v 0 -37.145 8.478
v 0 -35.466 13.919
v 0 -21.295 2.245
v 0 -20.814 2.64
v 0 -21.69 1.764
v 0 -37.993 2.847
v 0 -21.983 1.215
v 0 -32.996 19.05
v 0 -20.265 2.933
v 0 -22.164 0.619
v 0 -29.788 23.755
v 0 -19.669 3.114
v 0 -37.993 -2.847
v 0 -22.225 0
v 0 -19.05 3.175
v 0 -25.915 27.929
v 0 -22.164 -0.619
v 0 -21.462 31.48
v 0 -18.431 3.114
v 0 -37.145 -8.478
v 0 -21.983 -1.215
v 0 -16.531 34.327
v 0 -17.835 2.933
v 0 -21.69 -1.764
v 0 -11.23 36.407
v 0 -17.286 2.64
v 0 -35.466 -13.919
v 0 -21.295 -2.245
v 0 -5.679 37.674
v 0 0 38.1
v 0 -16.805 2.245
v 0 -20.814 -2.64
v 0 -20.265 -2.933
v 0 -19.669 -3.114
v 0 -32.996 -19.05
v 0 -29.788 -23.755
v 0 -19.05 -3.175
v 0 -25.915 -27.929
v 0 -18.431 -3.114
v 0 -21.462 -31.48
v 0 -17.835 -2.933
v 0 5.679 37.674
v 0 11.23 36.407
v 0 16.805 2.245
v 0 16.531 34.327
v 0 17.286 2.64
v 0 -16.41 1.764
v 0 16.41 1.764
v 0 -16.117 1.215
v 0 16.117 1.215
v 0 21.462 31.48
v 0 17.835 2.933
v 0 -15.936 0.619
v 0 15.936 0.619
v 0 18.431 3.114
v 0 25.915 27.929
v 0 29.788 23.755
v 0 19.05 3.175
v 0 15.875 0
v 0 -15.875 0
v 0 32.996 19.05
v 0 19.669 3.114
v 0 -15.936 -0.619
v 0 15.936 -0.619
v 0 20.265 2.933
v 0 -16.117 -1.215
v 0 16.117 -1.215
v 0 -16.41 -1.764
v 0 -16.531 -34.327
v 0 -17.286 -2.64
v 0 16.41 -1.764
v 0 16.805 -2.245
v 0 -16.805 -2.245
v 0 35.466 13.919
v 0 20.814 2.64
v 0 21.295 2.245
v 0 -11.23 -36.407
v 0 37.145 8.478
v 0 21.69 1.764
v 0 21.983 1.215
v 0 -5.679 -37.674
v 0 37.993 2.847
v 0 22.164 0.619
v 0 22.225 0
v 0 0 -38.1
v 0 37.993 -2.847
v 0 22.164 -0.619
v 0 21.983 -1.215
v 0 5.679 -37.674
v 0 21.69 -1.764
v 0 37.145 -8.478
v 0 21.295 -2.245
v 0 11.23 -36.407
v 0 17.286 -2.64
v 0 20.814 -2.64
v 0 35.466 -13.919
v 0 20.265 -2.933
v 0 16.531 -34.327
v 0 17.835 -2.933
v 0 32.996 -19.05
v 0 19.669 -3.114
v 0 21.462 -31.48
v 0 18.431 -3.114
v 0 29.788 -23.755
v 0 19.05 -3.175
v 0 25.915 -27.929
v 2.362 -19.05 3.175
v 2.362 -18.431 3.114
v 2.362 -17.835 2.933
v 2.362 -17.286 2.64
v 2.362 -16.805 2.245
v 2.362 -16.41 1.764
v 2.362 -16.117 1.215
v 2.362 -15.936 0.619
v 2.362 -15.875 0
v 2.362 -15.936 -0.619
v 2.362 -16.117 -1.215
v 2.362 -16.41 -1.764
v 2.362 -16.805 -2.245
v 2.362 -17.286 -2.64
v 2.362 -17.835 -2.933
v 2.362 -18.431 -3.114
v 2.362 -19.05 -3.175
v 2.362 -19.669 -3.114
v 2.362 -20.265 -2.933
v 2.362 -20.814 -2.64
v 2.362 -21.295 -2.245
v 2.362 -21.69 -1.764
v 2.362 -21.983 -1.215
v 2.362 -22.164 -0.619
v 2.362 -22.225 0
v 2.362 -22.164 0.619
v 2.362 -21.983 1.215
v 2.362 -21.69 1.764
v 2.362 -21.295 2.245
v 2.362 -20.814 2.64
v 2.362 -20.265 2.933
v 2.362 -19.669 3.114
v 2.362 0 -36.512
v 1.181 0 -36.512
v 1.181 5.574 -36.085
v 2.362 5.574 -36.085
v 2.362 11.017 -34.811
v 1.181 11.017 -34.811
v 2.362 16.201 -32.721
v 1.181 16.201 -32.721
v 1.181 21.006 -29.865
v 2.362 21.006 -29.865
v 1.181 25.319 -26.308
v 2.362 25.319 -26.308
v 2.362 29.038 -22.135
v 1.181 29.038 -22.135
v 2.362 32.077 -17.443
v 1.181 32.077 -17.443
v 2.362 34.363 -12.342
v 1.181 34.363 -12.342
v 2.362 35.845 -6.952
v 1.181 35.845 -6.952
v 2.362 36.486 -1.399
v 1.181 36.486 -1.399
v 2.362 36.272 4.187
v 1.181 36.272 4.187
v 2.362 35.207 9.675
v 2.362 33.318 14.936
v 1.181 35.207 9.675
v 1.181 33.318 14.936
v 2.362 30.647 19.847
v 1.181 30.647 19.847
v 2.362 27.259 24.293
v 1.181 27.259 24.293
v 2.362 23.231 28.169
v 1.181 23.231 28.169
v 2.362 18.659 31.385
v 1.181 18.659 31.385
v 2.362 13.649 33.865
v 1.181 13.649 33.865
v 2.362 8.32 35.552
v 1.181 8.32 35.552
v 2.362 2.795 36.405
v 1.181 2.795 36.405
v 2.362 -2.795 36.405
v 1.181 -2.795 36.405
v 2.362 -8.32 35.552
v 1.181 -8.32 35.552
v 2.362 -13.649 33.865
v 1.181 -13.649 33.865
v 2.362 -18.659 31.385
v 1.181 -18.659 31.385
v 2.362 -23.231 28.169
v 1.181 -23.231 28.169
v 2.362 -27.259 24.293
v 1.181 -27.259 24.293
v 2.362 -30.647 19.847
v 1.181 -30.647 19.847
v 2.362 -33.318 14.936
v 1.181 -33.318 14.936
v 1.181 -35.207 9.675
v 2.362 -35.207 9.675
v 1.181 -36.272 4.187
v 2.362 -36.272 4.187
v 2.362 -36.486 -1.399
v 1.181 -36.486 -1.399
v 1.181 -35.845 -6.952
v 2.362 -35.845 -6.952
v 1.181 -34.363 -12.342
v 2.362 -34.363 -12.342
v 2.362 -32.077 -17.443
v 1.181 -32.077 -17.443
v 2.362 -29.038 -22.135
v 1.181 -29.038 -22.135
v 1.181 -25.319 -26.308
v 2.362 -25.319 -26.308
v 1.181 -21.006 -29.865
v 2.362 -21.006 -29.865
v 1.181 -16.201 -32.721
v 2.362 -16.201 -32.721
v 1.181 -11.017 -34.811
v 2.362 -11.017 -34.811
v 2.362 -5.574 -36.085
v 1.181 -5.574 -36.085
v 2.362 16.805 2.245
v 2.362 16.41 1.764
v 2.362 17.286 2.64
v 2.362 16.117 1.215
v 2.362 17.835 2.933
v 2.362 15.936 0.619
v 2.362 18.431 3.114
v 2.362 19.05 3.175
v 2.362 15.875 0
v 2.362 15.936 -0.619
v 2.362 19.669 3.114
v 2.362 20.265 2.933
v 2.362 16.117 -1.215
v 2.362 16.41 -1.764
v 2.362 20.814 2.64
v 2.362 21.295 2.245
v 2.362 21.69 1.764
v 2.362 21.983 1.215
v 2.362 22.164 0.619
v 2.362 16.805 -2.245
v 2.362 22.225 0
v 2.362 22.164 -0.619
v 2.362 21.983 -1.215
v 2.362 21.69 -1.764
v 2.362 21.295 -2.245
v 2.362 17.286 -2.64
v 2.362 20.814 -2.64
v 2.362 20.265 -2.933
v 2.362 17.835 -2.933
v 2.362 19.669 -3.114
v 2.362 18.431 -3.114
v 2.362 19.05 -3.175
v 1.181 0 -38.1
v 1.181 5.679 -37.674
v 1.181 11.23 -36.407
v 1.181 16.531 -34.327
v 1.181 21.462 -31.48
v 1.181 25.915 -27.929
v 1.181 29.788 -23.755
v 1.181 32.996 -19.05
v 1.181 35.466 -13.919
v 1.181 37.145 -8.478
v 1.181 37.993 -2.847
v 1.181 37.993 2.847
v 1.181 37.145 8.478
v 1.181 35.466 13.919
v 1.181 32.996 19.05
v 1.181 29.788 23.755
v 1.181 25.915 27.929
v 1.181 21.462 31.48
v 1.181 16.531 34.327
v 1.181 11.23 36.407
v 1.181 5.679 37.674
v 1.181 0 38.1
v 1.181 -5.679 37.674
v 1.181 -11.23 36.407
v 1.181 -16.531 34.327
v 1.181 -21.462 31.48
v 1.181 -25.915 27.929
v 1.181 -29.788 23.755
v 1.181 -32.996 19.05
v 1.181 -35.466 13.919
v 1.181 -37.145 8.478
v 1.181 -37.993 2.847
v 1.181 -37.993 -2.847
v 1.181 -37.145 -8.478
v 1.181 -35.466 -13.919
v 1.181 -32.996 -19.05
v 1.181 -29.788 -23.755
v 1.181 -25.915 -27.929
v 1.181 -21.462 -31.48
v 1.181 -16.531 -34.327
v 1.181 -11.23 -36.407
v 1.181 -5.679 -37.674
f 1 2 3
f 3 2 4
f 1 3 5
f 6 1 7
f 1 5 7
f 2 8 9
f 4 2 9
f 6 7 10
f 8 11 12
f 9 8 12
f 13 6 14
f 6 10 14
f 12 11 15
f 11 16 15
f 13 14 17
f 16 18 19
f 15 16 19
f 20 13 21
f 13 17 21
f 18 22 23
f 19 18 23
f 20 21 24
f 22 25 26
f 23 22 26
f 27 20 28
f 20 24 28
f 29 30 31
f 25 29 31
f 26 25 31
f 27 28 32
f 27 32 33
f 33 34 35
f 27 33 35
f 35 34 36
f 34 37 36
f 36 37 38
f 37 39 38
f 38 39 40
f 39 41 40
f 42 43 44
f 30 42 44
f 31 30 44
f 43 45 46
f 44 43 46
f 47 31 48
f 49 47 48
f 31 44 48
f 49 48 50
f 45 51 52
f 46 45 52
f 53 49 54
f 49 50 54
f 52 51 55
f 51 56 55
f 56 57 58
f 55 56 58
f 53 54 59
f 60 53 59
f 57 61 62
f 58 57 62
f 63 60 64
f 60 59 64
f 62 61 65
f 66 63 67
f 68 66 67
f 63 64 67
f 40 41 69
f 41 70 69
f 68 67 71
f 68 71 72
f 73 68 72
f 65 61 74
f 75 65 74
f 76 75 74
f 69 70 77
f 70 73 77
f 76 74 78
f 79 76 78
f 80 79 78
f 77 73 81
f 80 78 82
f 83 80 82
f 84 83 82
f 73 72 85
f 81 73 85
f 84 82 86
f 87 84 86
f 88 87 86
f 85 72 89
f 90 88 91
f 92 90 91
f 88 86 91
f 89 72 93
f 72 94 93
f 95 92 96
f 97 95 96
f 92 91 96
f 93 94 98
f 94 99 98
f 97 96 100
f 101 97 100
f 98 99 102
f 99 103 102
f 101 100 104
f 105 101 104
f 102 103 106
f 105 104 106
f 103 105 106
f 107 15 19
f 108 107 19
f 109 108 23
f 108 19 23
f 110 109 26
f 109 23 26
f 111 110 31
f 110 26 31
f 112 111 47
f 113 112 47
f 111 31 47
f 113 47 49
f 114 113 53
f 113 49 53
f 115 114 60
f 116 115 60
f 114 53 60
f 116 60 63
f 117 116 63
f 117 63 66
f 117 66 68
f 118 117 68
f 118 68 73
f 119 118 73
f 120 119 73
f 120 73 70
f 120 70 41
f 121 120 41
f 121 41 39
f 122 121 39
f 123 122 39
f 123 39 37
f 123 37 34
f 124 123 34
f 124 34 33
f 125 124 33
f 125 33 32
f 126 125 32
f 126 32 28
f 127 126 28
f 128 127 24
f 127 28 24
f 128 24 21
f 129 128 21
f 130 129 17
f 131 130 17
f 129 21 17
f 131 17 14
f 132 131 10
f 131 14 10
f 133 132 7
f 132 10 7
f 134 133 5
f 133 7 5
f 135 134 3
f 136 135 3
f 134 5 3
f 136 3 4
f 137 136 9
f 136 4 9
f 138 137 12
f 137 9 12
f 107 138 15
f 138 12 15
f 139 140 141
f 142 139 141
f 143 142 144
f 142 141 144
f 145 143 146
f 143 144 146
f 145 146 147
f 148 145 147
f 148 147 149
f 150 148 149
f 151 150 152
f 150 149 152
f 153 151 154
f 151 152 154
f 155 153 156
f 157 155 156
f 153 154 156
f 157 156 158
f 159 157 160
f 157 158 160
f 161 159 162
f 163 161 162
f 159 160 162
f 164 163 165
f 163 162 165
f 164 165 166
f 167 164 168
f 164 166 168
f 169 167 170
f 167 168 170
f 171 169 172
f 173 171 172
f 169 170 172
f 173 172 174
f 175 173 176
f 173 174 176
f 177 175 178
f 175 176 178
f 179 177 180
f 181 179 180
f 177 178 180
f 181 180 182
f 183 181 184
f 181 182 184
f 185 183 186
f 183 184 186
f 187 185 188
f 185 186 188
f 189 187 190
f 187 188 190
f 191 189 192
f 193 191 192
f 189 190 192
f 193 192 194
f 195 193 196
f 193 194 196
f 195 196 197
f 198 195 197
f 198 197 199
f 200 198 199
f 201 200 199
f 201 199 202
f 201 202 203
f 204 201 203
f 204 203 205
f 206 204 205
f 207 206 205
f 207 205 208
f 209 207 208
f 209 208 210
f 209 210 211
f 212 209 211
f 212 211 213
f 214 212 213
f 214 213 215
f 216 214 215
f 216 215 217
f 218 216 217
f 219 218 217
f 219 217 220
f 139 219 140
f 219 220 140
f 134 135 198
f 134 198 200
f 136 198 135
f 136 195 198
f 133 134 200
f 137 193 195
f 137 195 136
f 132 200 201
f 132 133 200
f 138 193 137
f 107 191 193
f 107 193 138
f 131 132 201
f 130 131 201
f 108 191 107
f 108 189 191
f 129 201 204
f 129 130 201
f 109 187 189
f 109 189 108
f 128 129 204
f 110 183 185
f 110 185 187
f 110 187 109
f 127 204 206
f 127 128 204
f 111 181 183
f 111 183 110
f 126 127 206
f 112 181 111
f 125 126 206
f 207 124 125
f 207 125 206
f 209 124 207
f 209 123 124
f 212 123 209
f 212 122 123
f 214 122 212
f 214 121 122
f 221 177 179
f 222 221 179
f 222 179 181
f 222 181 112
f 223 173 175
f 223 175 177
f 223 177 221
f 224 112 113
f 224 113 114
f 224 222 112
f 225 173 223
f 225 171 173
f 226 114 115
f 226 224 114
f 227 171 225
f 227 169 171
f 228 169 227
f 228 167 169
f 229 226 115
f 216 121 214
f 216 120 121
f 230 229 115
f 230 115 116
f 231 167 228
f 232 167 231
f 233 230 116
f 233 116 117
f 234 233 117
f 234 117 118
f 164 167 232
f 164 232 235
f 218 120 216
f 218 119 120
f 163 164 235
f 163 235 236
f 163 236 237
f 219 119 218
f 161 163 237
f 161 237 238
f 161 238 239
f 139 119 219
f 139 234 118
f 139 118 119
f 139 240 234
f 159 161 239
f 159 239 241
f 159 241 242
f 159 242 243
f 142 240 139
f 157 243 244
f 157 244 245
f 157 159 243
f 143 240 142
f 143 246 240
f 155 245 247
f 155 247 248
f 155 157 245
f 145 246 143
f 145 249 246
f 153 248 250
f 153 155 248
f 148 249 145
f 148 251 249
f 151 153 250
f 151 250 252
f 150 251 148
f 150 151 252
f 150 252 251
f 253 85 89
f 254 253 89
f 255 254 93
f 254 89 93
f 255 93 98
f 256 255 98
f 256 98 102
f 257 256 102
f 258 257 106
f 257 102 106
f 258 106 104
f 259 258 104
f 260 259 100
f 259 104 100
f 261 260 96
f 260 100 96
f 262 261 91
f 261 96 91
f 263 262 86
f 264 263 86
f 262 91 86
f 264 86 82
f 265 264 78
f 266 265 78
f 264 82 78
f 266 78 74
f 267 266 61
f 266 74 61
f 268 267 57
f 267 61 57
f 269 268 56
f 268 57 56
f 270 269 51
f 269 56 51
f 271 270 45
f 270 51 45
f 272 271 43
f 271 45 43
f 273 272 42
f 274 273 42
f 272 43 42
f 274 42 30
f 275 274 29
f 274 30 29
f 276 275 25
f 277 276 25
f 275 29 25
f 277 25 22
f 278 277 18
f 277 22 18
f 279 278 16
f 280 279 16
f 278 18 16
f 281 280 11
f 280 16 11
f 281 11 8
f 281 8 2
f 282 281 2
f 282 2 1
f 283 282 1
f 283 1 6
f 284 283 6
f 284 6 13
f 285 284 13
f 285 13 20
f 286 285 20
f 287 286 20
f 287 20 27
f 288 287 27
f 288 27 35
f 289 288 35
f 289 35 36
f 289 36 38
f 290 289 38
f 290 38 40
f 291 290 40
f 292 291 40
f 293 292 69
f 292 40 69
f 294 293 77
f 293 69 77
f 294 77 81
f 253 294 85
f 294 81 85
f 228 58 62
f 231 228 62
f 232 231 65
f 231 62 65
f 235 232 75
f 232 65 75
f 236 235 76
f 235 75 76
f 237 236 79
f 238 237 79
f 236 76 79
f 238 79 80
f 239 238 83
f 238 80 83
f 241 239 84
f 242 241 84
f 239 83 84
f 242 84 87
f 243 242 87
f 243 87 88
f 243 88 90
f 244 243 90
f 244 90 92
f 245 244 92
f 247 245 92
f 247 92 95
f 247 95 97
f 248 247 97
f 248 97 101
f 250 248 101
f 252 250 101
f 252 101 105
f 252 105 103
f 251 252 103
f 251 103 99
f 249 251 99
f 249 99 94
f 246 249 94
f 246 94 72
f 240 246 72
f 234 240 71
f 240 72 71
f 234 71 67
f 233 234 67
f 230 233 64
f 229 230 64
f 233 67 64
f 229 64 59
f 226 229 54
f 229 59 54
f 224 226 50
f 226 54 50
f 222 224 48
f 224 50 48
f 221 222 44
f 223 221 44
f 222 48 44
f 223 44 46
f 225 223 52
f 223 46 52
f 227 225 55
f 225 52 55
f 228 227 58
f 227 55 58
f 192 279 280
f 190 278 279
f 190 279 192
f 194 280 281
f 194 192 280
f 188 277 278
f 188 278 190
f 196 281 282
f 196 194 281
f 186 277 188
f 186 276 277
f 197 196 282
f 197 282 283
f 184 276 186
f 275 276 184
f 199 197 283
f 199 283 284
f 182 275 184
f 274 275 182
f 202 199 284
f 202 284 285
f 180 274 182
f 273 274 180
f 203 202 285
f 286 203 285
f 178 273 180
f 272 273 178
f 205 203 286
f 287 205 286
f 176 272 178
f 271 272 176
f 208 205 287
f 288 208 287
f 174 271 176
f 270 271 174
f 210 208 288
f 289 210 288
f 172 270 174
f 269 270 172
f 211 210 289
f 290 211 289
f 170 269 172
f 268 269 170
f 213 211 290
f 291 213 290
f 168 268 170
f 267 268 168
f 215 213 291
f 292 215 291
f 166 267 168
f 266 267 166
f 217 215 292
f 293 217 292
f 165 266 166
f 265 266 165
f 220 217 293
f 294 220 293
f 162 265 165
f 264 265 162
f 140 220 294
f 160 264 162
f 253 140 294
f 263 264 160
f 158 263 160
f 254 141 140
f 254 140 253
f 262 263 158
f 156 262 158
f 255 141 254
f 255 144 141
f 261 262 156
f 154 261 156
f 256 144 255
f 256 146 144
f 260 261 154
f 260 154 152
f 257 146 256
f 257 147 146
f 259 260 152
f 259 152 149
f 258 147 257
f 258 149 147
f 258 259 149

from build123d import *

# Parameters (mm, degrees)
SKETCH1_R           = 38.1
BOSS_EXTRUDE1_DEPTH = 1.1811
SKETCH2_R           = 36.5125
BOSS_EXTRUDE2_DEPTH = 1.1811
SKETCH3_R           = 3.175
CUT_EXTRUDE1_DEPTH  = 54.933292027


with BuildPart() as part:
    # Sketch1 → Boss-Extrude1 (new body)
    with BuildSketch(Plane.YZ):
        with Locations(Location((0, 0, 0), (0, 0, 270))):
            Circle(SKETCH1_R)
    extrude(amount=BOSS_EXTRUDE1_DEPTH)

    # Sketch2 → Boss-Extrude2 (add)
    with BuildSketch(Plane.YZ.offset(1.1811)):
        with Locations(Location((0, 0, 0), (0, 0, 270))):
            Circle(SKETCH2_R)
    extrude(amount=BOSS_EXTRUDE2_DEPTH)

    # Sketch3 → Cut-Extrude1 (cut, through all)
    with BuildSketch(Plane(origin=(0, 0, 0), x_dir=(0, -1, 0), z_dir=(-1, 0, 0))):
        with Locations(Location((19.05, 0, 0), (0, 0, 90))):
            Circle(SKETCH3_R)
        with Locations(Location((-19.05, 0, 0), (0, 0, 90))):
            Circle(SKETCH3_R)
    extrude(amount=-CUT_EXTRUDE1_DEPTH, mode=Mode.SUBTRACT)


solid = part.part
